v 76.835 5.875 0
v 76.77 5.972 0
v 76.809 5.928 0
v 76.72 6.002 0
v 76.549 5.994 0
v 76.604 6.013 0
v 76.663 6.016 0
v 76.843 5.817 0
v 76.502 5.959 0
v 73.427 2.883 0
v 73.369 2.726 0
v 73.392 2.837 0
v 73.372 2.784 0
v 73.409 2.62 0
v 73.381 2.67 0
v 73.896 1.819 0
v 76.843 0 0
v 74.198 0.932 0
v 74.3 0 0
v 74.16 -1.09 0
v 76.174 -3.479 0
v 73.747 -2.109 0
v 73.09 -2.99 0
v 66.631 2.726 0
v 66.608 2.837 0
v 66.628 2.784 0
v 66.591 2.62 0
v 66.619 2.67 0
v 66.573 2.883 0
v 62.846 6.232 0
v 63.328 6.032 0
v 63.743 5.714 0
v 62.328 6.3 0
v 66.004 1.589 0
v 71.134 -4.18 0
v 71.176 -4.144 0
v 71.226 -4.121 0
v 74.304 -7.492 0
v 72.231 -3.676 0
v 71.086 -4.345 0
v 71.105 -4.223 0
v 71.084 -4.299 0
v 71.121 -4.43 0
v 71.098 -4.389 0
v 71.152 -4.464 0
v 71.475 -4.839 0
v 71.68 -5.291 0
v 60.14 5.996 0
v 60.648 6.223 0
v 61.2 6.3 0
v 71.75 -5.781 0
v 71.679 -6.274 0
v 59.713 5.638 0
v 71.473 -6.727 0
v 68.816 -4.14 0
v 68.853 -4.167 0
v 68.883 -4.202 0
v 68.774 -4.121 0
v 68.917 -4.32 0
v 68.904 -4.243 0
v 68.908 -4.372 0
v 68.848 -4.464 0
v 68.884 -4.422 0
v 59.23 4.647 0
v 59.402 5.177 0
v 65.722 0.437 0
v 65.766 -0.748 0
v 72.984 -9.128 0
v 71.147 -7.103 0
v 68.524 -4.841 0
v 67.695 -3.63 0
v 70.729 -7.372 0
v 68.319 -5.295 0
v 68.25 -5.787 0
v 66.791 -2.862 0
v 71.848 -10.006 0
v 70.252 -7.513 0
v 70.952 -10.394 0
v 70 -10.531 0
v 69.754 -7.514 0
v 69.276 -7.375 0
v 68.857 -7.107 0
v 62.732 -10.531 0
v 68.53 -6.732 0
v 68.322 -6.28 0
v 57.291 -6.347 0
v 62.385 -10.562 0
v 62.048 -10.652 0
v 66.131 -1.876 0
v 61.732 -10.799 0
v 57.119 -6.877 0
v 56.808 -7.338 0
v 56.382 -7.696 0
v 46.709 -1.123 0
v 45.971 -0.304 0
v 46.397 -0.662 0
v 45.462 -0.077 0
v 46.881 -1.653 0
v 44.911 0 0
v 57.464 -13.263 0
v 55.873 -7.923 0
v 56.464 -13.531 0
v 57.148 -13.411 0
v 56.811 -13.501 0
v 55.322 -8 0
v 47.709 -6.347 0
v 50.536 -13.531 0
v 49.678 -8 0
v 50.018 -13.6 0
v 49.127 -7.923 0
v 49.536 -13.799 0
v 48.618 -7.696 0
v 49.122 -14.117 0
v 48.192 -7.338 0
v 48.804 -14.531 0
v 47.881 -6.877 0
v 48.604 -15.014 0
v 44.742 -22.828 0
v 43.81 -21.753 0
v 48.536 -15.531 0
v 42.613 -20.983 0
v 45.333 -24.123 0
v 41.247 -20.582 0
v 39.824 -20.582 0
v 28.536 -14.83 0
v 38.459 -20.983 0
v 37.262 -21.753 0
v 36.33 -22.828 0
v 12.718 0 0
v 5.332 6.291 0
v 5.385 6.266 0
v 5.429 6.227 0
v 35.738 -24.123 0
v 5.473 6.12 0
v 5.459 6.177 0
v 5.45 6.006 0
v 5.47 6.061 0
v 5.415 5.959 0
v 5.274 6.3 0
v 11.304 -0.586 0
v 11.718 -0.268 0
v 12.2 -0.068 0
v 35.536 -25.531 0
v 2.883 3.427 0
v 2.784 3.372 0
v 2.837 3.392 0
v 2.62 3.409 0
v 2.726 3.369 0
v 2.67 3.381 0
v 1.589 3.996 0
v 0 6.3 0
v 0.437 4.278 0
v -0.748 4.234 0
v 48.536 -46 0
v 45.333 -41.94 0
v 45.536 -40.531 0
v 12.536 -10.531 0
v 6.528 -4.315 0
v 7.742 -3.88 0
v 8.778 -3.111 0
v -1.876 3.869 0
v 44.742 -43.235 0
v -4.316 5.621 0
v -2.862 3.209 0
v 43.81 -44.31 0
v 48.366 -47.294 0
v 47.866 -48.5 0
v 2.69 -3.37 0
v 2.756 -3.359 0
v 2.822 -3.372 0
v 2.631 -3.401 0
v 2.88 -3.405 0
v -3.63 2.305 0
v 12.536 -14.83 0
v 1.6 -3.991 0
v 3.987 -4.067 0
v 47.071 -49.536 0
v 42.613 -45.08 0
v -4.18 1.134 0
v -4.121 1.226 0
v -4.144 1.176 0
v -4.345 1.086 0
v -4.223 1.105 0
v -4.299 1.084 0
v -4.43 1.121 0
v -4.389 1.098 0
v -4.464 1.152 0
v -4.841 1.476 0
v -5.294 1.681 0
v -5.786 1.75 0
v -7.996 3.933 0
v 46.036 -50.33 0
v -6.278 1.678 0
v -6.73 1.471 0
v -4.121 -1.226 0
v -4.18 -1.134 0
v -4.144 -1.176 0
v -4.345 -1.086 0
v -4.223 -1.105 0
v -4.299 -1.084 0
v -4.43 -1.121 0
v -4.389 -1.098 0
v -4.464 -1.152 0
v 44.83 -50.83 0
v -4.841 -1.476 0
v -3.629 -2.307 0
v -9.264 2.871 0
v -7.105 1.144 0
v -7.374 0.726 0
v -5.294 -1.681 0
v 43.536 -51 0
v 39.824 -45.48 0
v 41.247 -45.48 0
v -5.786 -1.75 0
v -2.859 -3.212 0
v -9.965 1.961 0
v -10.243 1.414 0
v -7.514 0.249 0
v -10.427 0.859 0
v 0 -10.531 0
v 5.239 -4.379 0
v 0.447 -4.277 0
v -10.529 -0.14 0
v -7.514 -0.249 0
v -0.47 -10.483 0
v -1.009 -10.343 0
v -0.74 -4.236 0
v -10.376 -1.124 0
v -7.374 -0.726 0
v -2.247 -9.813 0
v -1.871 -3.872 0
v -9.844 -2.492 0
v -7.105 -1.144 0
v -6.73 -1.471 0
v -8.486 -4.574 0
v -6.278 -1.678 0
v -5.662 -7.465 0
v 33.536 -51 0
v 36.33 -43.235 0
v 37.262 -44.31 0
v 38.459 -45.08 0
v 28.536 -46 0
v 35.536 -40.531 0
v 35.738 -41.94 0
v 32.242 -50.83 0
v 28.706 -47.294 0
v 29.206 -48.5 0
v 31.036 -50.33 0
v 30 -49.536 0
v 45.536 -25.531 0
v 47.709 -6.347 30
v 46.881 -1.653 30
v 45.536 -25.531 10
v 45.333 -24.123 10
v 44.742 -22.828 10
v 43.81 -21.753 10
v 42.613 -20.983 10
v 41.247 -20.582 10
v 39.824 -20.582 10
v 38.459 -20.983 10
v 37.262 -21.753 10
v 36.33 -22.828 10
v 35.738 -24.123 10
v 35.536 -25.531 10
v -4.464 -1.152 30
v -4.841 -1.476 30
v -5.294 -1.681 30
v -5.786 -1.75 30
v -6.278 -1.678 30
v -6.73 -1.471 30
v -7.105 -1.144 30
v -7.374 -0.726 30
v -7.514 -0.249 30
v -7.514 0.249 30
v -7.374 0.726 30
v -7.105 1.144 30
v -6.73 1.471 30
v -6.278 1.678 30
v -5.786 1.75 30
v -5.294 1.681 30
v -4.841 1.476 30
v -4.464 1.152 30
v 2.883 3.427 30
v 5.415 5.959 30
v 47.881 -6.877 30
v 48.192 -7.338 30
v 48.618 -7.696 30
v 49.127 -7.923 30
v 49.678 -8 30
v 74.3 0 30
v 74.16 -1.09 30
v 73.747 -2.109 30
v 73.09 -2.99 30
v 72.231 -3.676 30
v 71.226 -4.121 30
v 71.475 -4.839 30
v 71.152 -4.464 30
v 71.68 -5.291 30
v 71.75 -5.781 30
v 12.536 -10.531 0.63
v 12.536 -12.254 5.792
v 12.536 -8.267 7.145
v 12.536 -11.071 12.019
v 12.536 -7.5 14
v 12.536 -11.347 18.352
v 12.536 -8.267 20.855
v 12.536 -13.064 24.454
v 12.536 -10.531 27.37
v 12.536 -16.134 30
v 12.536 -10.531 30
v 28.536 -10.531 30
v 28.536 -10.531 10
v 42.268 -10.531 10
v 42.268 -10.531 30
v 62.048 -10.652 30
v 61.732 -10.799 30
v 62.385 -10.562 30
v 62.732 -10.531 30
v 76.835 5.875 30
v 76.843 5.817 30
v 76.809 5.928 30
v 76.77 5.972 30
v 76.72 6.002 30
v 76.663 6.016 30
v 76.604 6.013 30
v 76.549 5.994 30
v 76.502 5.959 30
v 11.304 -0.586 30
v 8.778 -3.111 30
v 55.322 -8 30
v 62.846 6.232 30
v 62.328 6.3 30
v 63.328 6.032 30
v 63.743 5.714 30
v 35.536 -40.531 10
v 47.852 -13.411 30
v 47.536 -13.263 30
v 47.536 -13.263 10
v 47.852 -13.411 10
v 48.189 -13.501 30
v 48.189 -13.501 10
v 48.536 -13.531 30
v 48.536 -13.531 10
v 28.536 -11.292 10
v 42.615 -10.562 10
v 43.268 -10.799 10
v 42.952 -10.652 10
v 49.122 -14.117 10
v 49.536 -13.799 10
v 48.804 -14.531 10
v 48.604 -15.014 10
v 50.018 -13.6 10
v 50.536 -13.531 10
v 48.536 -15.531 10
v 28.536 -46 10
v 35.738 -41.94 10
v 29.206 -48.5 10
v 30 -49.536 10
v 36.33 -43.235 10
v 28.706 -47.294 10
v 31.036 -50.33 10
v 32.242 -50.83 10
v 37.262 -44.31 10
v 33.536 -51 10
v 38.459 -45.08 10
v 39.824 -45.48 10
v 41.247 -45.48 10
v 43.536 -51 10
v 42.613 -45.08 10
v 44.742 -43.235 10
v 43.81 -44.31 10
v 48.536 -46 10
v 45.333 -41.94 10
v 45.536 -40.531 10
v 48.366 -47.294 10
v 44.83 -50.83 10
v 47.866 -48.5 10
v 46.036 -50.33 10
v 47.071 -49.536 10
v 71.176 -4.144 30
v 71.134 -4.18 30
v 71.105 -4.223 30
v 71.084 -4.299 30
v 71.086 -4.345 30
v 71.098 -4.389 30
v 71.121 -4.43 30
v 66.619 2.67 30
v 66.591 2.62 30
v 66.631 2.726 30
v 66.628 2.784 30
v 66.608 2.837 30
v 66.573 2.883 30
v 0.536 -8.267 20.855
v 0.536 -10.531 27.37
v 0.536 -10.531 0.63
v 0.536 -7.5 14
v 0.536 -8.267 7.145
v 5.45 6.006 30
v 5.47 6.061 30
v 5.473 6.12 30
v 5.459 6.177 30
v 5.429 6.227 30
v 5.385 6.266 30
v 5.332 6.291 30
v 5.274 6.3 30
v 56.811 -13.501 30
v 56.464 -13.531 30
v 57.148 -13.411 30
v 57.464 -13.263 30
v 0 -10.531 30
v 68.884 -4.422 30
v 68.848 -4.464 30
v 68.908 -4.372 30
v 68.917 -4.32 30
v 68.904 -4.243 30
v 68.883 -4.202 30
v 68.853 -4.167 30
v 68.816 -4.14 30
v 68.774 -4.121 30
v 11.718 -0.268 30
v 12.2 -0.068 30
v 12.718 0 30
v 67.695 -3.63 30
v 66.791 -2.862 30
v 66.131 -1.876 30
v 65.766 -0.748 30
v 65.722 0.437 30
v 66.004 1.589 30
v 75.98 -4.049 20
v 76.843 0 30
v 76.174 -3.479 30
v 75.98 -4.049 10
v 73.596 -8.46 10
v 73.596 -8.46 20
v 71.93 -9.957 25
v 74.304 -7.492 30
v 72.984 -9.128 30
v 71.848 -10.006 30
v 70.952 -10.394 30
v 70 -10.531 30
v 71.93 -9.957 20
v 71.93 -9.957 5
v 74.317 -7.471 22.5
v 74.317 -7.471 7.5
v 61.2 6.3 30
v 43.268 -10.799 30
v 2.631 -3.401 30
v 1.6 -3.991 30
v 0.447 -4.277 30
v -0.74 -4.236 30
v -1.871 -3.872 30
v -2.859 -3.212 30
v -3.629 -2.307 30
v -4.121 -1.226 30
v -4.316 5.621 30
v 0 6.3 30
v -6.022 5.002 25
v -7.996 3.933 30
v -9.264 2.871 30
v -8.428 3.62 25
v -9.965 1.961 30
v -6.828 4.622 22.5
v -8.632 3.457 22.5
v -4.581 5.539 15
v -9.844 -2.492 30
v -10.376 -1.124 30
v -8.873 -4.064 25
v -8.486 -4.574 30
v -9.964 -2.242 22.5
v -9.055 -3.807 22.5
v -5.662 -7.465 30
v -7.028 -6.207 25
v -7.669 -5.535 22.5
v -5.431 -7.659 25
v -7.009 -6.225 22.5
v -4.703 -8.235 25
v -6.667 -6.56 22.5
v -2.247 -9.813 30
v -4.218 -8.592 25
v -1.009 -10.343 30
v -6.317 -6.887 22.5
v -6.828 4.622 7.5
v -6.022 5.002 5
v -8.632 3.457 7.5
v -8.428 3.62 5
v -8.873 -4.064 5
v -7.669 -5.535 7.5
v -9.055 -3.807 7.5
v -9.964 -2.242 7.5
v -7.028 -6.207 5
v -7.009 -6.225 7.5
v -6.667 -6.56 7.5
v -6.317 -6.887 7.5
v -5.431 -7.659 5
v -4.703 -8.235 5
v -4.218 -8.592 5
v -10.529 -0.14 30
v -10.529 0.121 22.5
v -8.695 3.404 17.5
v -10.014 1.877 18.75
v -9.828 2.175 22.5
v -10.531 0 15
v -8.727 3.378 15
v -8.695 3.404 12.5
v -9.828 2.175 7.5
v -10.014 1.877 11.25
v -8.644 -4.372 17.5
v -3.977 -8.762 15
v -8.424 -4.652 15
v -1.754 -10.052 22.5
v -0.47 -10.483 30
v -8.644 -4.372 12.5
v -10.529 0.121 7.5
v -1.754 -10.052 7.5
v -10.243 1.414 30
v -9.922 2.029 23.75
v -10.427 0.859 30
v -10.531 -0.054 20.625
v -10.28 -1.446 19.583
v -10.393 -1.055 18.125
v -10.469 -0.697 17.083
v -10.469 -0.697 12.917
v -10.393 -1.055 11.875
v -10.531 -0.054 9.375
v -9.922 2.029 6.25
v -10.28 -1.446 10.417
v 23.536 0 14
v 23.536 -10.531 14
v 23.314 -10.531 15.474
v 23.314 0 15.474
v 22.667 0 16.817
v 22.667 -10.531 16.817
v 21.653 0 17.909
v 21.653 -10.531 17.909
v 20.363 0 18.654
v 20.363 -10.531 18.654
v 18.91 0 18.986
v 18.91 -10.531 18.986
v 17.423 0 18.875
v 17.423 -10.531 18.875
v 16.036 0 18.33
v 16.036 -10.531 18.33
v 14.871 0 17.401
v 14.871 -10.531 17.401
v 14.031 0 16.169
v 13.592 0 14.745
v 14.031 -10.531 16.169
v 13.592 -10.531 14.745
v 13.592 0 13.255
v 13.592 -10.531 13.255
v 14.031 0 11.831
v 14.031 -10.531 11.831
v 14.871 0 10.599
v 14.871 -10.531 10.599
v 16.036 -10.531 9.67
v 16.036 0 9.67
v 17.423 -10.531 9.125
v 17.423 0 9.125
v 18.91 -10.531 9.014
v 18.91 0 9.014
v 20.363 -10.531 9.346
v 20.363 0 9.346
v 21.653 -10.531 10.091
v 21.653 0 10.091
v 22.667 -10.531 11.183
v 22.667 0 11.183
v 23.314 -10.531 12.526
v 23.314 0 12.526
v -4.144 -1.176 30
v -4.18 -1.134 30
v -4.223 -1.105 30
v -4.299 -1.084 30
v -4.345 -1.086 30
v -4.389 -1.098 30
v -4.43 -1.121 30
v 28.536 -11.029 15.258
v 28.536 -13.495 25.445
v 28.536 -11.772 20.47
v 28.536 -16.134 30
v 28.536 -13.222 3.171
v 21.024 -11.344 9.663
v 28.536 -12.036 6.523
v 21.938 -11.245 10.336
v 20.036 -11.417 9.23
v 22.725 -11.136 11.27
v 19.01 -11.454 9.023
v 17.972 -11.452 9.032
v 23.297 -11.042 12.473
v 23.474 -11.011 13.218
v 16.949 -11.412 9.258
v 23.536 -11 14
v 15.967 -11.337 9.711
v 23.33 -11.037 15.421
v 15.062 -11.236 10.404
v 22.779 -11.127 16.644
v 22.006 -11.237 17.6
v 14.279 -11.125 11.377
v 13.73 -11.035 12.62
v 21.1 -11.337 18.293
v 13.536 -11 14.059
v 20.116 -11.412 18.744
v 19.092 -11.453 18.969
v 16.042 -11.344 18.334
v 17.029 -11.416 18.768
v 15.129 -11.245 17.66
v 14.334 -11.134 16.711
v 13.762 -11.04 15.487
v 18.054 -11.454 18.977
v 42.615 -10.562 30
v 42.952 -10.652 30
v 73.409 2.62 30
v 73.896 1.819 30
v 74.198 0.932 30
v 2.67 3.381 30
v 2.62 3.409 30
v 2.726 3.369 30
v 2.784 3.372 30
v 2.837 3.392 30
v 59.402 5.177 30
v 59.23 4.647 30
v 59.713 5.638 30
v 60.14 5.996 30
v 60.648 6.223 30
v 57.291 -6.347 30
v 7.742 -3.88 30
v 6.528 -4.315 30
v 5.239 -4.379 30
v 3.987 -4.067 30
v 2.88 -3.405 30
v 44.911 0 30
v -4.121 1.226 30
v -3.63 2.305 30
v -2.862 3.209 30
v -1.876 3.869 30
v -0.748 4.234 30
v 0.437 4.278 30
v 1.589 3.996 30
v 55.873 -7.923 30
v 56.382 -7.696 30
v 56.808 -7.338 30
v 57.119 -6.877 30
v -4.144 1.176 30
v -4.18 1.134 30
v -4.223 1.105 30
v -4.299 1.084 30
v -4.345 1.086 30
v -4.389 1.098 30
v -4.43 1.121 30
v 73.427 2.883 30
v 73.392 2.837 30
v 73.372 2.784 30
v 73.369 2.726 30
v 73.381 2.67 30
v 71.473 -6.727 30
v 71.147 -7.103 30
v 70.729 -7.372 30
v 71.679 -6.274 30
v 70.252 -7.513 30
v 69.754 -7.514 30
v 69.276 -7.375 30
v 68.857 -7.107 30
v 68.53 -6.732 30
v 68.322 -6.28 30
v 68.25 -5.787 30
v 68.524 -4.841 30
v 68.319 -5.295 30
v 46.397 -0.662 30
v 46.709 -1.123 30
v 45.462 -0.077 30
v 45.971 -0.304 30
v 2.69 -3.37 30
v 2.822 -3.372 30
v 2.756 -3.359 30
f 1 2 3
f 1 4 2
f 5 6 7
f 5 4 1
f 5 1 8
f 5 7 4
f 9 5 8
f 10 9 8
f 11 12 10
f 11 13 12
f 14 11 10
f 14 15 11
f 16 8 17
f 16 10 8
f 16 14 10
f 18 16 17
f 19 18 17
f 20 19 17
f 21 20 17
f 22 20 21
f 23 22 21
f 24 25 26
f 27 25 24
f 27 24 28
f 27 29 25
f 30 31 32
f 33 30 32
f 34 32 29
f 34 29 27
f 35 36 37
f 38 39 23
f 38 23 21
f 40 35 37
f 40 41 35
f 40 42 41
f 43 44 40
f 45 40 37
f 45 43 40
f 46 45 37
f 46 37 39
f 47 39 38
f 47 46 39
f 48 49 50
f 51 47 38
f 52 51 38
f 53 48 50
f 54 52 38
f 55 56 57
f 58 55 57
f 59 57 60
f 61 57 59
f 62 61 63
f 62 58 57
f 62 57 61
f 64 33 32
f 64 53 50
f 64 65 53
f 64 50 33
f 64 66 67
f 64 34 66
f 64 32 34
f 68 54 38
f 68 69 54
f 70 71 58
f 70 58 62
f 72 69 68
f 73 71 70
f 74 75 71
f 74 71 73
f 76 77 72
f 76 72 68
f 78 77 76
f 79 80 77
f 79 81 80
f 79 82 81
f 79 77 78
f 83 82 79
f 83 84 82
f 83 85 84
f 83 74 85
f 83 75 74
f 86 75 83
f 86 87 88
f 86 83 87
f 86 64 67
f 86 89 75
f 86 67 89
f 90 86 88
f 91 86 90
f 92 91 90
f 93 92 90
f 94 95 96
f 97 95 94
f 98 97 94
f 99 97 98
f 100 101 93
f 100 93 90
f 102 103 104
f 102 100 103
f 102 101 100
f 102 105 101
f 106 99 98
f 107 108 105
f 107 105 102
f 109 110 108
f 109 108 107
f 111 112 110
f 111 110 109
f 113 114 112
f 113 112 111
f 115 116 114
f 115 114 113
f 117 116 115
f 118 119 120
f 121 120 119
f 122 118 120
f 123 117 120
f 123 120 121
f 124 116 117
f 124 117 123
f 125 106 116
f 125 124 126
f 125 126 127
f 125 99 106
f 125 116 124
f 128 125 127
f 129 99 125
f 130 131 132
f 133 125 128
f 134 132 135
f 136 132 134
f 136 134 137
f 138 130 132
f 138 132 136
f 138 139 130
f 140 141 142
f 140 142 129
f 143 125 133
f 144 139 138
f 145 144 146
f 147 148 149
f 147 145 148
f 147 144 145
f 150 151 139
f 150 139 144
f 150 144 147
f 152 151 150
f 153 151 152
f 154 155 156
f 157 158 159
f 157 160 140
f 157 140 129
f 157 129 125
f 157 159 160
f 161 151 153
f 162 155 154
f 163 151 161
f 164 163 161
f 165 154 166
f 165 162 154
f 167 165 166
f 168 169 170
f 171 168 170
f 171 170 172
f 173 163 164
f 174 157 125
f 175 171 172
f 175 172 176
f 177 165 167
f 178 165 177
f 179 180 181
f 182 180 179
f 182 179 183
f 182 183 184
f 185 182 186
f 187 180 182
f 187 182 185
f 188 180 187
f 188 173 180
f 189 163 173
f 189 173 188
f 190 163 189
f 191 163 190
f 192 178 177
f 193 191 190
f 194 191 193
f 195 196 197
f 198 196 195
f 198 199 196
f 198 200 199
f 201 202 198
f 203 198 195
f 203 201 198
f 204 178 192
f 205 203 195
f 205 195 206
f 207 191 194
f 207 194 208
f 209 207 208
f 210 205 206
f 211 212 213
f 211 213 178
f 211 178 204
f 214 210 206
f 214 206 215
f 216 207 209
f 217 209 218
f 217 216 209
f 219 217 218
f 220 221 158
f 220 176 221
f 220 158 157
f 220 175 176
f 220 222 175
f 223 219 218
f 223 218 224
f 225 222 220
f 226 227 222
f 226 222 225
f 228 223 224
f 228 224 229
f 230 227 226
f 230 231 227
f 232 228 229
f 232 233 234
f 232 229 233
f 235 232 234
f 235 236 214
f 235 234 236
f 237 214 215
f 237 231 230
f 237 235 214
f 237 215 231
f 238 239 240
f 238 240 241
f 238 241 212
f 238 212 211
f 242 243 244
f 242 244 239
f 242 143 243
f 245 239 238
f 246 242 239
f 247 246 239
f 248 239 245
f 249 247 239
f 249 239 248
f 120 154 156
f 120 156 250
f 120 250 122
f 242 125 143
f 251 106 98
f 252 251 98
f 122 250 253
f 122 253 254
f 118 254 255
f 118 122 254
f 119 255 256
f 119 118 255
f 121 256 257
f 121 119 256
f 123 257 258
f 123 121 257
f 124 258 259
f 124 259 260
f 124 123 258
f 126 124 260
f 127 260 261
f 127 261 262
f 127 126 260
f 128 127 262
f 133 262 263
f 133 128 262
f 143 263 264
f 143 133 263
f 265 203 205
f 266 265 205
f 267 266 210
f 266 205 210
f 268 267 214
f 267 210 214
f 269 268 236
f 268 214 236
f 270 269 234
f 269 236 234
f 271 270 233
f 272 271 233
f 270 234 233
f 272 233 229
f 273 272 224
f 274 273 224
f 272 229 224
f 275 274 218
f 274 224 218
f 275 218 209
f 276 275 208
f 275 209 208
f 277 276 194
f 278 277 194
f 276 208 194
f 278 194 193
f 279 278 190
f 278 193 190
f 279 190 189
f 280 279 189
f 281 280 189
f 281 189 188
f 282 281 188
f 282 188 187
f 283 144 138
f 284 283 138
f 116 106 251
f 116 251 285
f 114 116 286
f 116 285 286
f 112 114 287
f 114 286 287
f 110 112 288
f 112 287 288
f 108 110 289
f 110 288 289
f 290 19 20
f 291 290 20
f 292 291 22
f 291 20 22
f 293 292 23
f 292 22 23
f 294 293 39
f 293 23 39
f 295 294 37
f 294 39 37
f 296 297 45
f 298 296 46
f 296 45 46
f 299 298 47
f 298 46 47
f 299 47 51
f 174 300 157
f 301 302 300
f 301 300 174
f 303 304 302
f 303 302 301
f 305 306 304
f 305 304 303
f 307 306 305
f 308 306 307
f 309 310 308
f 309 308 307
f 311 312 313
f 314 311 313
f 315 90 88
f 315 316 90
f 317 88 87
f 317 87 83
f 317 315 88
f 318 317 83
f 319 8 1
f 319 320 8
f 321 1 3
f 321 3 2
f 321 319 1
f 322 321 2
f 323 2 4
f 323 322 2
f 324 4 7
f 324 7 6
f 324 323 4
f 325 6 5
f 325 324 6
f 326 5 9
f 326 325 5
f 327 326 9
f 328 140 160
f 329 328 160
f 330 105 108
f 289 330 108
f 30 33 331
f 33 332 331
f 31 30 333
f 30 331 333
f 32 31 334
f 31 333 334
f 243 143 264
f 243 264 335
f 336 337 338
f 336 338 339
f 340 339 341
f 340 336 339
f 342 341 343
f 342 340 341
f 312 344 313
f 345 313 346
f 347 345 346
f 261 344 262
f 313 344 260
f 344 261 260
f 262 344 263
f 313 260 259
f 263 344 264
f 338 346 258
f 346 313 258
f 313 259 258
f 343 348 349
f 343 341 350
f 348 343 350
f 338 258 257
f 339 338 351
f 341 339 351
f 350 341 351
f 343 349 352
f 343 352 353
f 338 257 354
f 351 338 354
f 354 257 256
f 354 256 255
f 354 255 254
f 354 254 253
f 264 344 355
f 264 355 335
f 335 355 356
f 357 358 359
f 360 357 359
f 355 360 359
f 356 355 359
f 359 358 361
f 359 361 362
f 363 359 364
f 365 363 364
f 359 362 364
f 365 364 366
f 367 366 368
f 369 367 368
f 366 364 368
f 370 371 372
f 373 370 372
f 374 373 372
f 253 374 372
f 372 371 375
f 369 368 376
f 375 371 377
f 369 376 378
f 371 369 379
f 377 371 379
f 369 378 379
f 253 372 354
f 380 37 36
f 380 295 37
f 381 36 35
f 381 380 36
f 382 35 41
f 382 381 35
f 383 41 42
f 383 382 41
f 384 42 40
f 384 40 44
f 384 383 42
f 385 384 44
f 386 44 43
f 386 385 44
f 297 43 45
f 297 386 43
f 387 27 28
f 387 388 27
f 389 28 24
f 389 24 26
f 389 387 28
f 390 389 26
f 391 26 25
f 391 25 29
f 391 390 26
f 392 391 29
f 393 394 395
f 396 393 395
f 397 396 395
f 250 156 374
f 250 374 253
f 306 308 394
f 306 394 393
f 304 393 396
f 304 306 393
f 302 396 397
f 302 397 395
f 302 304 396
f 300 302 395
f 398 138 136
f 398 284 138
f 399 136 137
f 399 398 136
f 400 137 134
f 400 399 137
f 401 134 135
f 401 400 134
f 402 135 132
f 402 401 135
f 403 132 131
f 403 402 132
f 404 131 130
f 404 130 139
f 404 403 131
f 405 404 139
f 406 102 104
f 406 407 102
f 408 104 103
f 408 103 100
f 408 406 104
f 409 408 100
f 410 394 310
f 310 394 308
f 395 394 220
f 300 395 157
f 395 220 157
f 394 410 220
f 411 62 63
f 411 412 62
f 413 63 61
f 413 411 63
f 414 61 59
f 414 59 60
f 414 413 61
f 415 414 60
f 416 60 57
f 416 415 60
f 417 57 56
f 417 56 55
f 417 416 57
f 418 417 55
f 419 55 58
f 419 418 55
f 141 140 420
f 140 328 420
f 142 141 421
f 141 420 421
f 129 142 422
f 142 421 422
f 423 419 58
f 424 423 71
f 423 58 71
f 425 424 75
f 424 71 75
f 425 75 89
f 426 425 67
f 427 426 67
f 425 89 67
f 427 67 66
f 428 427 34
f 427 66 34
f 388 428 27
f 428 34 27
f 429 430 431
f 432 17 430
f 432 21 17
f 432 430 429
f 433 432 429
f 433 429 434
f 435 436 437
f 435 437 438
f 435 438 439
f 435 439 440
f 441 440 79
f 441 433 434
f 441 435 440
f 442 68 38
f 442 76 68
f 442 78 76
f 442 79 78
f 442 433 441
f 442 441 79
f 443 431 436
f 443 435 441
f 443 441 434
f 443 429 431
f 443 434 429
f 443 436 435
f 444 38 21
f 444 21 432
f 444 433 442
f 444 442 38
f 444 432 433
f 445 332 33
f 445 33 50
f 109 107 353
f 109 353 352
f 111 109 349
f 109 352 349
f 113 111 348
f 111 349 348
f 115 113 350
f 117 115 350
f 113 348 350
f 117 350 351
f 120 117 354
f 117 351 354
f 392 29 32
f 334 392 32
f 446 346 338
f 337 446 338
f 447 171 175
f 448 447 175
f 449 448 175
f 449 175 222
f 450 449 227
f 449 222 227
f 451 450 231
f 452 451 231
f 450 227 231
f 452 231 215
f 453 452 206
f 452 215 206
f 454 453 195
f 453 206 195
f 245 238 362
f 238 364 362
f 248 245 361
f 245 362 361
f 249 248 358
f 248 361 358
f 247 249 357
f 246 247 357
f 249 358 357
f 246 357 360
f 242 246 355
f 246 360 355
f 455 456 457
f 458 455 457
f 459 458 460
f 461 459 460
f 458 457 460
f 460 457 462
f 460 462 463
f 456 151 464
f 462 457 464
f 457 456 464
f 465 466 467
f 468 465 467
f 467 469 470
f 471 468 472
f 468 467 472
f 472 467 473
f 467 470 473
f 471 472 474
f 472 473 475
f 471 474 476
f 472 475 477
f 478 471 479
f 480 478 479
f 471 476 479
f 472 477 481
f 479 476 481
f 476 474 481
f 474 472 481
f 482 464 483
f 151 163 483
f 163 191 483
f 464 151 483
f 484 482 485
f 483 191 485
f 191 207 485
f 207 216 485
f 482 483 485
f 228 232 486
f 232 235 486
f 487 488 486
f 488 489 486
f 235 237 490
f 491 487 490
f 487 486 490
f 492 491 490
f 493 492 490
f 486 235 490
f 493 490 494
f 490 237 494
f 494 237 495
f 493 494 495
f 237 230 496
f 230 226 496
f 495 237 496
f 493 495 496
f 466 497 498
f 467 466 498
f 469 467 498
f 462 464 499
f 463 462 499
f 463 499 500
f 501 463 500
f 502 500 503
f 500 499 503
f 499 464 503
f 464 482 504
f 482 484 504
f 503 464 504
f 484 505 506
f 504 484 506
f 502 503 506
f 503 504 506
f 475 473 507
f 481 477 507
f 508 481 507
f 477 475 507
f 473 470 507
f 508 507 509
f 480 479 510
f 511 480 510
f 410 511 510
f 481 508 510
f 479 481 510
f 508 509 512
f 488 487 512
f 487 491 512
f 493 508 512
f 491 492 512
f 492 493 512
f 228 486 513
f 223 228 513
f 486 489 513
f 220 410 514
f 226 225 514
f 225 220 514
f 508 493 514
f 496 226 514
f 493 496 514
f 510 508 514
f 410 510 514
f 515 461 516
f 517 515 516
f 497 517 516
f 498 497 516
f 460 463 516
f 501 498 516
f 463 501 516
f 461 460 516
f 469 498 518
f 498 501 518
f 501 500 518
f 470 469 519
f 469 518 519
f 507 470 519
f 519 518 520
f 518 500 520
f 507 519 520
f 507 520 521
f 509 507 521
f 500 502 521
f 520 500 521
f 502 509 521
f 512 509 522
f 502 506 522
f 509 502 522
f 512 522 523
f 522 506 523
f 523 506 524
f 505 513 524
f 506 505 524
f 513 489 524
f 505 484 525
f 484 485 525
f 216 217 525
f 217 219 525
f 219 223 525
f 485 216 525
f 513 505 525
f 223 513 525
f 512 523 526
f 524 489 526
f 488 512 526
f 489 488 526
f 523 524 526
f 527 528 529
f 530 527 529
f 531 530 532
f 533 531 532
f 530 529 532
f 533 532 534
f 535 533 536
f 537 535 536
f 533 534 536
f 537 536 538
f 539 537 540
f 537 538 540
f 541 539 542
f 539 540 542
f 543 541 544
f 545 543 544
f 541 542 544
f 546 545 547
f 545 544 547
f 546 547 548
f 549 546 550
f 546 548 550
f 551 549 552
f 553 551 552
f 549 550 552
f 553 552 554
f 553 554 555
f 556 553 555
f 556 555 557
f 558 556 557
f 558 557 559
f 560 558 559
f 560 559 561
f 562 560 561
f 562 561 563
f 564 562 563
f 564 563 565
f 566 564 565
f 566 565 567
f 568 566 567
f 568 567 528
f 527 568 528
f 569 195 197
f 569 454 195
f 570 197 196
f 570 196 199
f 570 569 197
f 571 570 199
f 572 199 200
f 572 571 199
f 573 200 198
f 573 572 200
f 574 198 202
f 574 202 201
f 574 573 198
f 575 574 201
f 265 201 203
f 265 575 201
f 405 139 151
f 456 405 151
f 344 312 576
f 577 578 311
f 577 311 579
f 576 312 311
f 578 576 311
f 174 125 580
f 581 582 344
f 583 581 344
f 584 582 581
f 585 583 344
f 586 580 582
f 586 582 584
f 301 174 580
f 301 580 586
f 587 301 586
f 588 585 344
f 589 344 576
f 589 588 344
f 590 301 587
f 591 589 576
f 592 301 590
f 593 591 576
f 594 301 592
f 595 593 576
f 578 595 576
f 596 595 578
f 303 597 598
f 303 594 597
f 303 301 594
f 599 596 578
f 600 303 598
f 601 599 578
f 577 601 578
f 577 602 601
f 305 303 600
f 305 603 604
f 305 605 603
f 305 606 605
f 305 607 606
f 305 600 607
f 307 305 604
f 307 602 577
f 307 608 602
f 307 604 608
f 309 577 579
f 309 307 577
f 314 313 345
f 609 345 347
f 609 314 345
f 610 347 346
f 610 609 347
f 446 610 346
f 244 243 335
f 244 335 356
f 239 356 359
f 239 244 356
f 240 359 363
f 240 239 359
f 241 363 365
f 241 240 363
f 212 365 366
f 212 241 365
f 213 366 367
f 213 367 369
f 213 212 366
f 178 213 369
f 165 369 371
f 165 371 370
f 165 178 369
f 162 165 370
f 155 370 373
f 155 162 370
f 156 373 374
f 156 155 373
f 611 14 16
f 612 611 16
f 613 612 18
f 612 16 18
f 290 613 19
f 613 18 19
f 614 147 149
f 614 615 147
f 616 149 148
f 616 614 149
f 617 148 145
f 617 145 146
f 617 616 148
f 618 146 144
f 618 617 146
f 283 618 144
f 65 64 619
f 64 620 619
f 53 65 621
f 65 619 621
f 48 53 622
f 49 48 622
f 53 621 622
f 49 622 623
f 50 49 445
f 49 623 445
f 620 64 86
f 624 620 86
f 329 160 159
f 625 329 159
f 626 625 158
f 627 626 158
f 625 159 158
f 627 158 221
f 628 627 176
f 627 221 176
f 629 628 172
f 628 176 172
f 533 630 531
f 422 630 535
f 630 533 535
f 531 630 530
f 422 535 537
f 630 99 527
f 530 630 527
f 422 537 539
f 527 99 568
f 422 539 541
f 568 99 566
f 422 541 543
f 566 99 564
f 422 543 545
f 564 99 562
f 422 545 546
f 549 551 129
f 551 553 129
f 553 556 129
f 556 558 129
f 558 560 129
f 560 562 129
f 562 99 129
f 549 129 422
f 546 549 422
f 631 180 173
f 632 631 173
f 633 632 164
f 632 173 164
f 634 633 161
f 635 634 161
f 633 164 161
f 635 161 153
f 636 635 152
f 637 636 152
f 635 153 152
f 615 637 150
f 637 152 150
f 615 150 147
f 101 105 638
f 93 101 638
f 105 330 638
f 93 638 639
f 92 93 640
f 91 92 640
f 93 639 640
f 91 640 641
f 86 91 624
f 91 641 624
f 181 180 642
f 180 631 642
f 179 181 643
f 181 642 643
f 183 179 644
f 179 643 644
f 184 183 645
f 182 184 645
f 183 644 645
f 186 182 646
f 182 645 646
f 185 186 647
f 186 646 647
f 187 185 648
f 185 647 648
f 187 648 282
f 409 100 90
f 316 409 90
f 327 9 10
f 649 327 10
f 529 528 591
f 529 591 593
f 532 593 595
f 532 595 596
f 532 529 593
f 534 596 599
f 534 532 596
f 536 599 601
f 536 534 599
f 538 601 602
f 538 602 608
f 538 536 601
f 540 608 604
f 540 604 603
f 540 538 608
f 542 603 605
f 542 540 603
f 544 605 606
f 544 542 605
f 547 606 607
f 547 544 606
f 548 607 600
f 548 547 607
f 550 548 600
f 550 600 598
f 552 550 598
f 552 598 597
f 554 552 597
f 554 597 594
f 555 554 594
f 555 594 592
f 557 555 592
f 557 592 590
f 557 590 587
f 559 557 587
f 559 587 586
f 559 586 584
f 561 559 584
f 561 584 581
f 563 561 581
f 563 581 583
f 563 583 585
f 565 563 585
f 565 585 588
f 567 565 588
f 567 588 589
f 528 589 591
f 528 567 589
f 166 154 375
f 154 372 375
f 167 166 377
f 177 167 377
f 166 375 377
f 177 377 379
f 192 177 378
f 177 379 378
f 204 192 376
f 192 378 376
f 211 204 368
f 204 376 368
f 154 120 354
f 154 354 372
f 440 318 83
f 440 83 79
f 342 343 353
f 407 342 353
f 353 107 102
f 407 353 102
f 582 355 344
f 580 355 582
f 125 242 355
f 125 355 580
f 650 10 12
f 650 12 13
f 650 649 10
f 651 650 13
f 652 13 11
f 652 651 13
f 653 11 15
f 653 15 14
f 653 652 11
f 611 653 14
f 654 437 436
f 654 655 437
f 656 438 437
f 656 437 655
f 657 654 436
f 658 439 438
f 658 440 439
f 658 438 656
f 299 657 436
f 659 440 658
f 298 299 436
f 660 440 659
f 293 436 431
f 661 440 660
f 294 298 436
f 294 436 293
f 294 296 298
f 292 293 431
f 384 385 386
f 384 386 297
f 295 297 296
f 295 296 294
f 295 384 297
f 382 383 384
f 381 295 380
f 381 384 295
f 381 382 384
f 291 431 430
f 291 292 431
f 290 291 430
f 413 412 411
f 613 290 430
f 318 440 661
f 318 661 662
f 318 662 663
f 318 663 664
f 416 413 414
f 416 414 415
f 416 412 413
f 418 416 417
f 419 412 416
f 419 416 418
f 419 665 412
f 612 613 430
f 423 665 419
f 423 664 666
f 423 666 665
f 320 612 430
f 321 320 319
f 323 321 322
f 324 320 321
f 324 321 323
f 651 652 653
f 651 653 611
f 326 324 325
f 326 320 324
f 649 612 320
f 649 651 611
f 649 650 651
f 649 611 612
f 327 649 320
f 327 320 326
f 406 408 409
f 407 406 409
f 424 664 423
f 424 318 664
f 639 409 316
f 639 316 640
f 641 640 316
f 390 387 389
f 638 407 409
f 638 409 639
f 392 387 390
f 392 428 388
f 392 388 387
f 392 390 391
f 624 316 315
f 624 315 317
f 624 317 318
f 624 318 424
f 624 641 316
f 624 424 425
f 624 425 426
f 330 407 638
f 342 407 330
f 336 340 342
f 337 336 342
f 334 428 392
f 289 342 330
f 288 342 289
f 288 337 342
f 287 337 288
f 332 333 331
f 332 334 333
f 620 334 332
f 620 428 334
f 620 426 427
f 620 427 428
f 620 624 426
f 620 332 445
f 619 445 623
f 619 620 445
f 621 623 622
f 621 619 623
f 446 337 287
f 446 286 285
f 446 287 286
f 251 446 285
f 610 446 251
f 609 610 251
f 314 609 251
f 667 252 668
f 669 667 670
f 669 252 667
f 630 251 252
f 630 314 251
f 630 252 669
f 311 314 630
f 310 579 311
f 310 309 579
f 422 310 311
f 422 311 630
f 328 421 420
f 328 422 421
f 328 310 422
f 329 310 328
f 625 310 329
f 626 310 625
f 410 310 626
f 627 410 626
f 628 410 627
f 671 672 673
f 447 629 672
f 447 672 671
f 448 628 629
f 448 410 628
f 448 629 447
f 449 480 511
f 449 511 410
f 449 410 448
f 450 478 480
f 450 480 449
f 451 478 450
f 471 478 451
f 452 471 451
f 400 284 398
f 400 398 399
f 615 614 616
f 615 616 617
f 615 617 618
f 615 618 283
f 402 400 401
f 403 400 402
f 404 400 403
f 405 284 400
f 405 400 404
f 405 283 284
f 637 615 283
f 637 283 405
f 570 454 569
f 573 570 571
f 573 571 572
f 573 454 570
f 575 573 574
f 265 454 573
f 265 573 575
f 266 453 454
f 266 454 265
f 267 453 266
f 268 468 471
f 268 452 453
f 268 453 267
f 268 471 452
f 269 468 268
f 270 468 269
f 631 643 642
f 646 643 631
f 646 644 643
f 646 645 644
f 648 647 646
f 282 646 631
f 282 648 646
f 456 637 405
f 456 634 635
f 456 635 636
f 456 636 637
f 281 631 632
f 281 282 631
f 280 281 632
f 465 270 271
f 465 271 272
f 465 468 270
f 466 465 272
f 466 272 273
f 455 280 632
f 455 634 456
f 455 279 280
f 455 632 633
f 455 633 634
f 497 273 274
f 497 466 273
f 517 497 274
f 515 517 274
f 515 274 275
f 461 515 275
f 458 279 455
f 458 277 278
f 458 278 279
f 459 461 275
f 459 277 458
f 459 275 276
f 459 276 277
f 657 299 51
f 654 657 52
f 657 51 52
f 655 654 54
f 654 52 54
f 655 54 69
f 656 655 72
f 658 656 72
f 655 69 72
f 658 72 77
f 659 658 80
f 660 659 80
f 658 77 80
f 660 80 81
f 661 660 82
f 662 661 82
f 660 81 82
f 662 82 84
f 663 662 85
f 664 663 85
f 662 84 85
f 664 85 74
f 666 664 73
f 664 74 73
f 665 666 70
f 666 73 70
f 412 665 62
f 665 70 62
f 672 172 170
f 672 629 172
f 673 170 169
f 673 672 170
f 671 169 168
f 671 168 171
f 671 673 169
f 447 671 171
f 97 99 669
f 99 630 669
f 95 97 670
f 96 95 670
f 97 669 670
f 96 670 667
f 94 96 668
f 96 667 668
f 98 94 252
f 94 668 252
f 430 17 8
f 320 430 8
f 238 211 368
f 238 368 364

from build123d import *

# Parameters (mm, degrees)
F1_DEPTH       = 30
F2_R           = 0.2
F3_R           = 2
F5_DEPTH       = 10
F8_DEPTH       = 6
F8_DEPTH_BACK  = 10
F10_DEPTH      = 12
F11_R          = 5
F12_DEPTH      = 40.4696358235
F12_DEPTH_BACK = 16.8323643765
F13_R          = 2
F14_R          = 5


# Not quite as in the source:
# - ends of sketch curves that miss each other by under 0.0002 mm in the source are joined


with BuildPart() as f1:
    # F0 (on Top) → F1 (new body)
    with BuildSketch(Plane.XY):
        with BuildLine():
            ThreePointArc((-4.2249260349, 0.8), (-1.4496004126, 4.0482908299), (2.7568097504, 3.3))
            Line((2.7568097504, 3.3), (5.7568097504, 6.3))
            Line((5.7568097504, 6.3), (0, 6.3))
            add(Edge.make_bspline(
                [(0, 6.3), (-4.1648952214, 6.3), (-17.5449881237, 1.3096127619), (-2.8048020259, -10.5313642765), (0, -10.5313642765)],
                knots=[0, 0, 0, 0, 0.475816506, 1, 1, 1, 1], degree=3))
            Line((0, -10.5313642765), (42.8038475773, -10.5313642765))
            Line((42.8038475773, -10.5313642765), (62.1961524227, -10.5313642765))
            Line((62.1961524227, -10.5313642765), (70, -10.5313642765))
            add(Edge.make_bspline(
                [(76.8431902496, 0), (76.8431902496, -2.967218801), (74.0984288633, -10.5313642765), (70, -10.5313642765)],
                knots=[0, 0, 0, 0, 0.4787052711, 0.4787052711, 0.4787052711, 0.4787052711], degree=3))
            Line((76.8431902496, 0), (76.8431902496, 6.3))
            Line((76.8431902496, 6.3), (73.3, 2.7568097504))
            ThreePointArc((73.3, 2.7568097504), (74.0422765863, 1.4662878299), (74.3, 0))
            ThreePointArc((74.3, 0), (73.311344138, -2.7431733449), (70.8, -4.2249260349))
            ThreePointArc((70.8, -4.2249260349), (71.4937369246, -4.86963515), (71.75, -5.7813642765))
            ThreePointArc((71.75, -5.7813642765), (69.0882708736, -7.2751012011), (69.2, -4.2249260349))
            ThreePointArc((69.2, -4.2249260349), (65.9517091701, -1.4496004126), (66.7, 2.7568097504))
            Line((66.7, 2.7568097504), (63.1568097504, 6.3))
            Line((63.1568097504, 6.3), (59.5214758241, 6.3))
            Line((59.5214758241, 6.3), (57, -8))
            Line((57, -8), (48, -8))
            Line((48, -8), (46.5893841543, 0))
            Line((46.5893841543, 0), (11.889675867, 0))
            Line((11.889675867, 0), (8.7784060298, -3.1112698372))
            ThreePointArc((8.7784060298, -3.1112698372), (5.8049742519, -4.3978404552), (2.7568097504, -3.3))
            ThreePointArc((2.7568097504, -3.3), (-1.4496004126, -4.0482908299), (-4.2249260349, -0.8))
            ThreePointArc((-4.2249260349, -0.8), (-7.5313642765, 0), (-4.2249260349, 0.8))
        make_face()
        Polygon((62.1961524227, -10.5313642765), (42.8038475773, -10.5313642765), (48, -13.5313642765), (57, -13.5313642765), align=None)
    extrude(amount=F1_DEPTH)

    # F2
    f2_edges = [f1.edges().sort_by_distance(p)[0] for p in [
        (5.75681, 6.3, 15),
        (2.75681, 3.3, 15),
        (-4.224926, 0.8, 15),
        (-4.224926, -0.8, 15),
        (2.75681, -3.3, 15),
        (76.84319, 6.3, 15),
        (66.7, 2.75681, 15),
        (69.2, -4.224926, 15),
        (70.8, -4.224926, 15),
        (73.3, 2.75681, 15),
    ]]
    fillet(f2_edges, radius=F2_R)

    # F3
    f3_edges = [f1.edges().sort_by_distance(p)[0] for p in [
        (63.15681, 6.3, 15),
        (48, -8, 15),
        (59.521476, 6.3, 15),
        (46.589384, 0, 15),
        (57, -8, 15),
        (11.889676, 0, 15),
        (42.803848, -10.531364, 15),
        (48, -13.531364, 15),
        (57, -13.531364, 15),
        (62.196152, -10.531364, 15),
    ]]
    fillet(f3_edges, radius=F3_R)

    # F4 (on face) → F5 (join)
    with BuildSketch(Plane(origin=(0, 0, 0), x_dir=(1, 0, 0), z_dir=(0, 0, -1))):
        with BuildLine():
            Line((28.5358983849, 51), (28.5358983849, 10.5313642765))
            Line((28.5358983849, 10.5313642765), (42.2679491924, 10.5313642765))
            ThreePointArc((42.2679491924, 10.5313642765), (42.7855872826, 10.5995126239), (43.2679491924, 10.7993134689))
            Line((43.2679491924, 10.7993134689), (47.5358983849, 13.2634150841))
            ThreePointArc((47.5358983849, 13.2634150841), (48.0182602947, 13.4632159291), (48.5358983849, 13.5313642765))
            Line((48.5358983849, 13.5313642765), (48.5358983849, 51))
            Line((48.5358983849, 51), (28.5358983849, 51))
        make_face()
        with BuildLine():
            ThreePointArc((35.5358983849, 40.5313642765), (40.5358983849, 45.5313642765), (45.5358983849, 40.5313642765))
            Line((45.5358983849, 40.5313642765), (45.5358983849, 25.5313642765))
            ThreePointArc((45.5358983849, 25.5313642765), (40.5358983849, 20.5313642765), (35.5358983849, 25.5313642765))
            Line((35.5358983849, 25.5313642765), (35.5358983849, 40.5313642765))
        make_face(mode=Mode.SUBTRACT)
    extrude(amount=-F5_DEPTH)

    # F7 (on offset) → F8 (join, two sides)
    with BuildSketch(Plane(origin=(18.5358983849, 0, 0), x_dir=(0, -1, 0), z_dir=(-1, 0, 0))) as f8_sk:
        with BuildLine():
            ThreePointArc((14.8303992429, 0), (11.0259152701, 15.1935946786), (16.1337307537, 30))
            Line((16.1337307537, 30), (10.5313622104, 30))
            Line((10.5313622104, 30), (10.5313642765, 0))
            Line((10.5313642765, 0), (14.8303992429, 0))
        make_face()
    extrude(amount=F8_DEPTH)
    extrude(f8_sk.sketch, amount=-F8_DEPTH_BACK)

    # F9 (on face) → F10 (cut)
    with BuildSketch(Plane(origin=(12.5358983849, 0, 0), x_dir=(0, -1, 0), z_dir=(-1, 0, 0))):
        with BuildLine():
            Line((10.5313642765, 0.6300555063), (10.5313642765, 27.3699444937))
            ThreePointArc((10.5313642765, 27.3699444937), (7.5, 14), (10.5313642765, 0.6300555063))
        make_face()
    extrude(amount=F10_DEPTH, mode=Mode.SUBTRACT)

    # F11 (on face) → F12 (cut, two sides)
    with BuildSketch(Plane.XZ.offset(10.5313642765)) as f12_sk:
        with Locations((18.5358983849, 14)):
            Circle(F11_R)
    extrude(amount=F12_DEPTH, mode=Mode.SUBTRACT)
    extrude(f12_sk.sketch, amount=-F12_DEPTH_BACK, mode=Mode.SUBTRACT)

    # F13
    f13_edges = [f1.edges().sort_by_distance(p)[0] for p in [
        (48.535898, -13.531364, 5),
        (48.535898, -13.531364, 20),
    ]]
    fillet(f13_edges, radius=F13_R)

    # F14
    f14_edges = [f1.edges().sort_by_distance(p)[0] for p in [
        (28.535898, -51, 5),
        (48.535898, -51, 5),
    ]]
    fillet(f14_edges, radius=F14_R)


solid = f1.part
